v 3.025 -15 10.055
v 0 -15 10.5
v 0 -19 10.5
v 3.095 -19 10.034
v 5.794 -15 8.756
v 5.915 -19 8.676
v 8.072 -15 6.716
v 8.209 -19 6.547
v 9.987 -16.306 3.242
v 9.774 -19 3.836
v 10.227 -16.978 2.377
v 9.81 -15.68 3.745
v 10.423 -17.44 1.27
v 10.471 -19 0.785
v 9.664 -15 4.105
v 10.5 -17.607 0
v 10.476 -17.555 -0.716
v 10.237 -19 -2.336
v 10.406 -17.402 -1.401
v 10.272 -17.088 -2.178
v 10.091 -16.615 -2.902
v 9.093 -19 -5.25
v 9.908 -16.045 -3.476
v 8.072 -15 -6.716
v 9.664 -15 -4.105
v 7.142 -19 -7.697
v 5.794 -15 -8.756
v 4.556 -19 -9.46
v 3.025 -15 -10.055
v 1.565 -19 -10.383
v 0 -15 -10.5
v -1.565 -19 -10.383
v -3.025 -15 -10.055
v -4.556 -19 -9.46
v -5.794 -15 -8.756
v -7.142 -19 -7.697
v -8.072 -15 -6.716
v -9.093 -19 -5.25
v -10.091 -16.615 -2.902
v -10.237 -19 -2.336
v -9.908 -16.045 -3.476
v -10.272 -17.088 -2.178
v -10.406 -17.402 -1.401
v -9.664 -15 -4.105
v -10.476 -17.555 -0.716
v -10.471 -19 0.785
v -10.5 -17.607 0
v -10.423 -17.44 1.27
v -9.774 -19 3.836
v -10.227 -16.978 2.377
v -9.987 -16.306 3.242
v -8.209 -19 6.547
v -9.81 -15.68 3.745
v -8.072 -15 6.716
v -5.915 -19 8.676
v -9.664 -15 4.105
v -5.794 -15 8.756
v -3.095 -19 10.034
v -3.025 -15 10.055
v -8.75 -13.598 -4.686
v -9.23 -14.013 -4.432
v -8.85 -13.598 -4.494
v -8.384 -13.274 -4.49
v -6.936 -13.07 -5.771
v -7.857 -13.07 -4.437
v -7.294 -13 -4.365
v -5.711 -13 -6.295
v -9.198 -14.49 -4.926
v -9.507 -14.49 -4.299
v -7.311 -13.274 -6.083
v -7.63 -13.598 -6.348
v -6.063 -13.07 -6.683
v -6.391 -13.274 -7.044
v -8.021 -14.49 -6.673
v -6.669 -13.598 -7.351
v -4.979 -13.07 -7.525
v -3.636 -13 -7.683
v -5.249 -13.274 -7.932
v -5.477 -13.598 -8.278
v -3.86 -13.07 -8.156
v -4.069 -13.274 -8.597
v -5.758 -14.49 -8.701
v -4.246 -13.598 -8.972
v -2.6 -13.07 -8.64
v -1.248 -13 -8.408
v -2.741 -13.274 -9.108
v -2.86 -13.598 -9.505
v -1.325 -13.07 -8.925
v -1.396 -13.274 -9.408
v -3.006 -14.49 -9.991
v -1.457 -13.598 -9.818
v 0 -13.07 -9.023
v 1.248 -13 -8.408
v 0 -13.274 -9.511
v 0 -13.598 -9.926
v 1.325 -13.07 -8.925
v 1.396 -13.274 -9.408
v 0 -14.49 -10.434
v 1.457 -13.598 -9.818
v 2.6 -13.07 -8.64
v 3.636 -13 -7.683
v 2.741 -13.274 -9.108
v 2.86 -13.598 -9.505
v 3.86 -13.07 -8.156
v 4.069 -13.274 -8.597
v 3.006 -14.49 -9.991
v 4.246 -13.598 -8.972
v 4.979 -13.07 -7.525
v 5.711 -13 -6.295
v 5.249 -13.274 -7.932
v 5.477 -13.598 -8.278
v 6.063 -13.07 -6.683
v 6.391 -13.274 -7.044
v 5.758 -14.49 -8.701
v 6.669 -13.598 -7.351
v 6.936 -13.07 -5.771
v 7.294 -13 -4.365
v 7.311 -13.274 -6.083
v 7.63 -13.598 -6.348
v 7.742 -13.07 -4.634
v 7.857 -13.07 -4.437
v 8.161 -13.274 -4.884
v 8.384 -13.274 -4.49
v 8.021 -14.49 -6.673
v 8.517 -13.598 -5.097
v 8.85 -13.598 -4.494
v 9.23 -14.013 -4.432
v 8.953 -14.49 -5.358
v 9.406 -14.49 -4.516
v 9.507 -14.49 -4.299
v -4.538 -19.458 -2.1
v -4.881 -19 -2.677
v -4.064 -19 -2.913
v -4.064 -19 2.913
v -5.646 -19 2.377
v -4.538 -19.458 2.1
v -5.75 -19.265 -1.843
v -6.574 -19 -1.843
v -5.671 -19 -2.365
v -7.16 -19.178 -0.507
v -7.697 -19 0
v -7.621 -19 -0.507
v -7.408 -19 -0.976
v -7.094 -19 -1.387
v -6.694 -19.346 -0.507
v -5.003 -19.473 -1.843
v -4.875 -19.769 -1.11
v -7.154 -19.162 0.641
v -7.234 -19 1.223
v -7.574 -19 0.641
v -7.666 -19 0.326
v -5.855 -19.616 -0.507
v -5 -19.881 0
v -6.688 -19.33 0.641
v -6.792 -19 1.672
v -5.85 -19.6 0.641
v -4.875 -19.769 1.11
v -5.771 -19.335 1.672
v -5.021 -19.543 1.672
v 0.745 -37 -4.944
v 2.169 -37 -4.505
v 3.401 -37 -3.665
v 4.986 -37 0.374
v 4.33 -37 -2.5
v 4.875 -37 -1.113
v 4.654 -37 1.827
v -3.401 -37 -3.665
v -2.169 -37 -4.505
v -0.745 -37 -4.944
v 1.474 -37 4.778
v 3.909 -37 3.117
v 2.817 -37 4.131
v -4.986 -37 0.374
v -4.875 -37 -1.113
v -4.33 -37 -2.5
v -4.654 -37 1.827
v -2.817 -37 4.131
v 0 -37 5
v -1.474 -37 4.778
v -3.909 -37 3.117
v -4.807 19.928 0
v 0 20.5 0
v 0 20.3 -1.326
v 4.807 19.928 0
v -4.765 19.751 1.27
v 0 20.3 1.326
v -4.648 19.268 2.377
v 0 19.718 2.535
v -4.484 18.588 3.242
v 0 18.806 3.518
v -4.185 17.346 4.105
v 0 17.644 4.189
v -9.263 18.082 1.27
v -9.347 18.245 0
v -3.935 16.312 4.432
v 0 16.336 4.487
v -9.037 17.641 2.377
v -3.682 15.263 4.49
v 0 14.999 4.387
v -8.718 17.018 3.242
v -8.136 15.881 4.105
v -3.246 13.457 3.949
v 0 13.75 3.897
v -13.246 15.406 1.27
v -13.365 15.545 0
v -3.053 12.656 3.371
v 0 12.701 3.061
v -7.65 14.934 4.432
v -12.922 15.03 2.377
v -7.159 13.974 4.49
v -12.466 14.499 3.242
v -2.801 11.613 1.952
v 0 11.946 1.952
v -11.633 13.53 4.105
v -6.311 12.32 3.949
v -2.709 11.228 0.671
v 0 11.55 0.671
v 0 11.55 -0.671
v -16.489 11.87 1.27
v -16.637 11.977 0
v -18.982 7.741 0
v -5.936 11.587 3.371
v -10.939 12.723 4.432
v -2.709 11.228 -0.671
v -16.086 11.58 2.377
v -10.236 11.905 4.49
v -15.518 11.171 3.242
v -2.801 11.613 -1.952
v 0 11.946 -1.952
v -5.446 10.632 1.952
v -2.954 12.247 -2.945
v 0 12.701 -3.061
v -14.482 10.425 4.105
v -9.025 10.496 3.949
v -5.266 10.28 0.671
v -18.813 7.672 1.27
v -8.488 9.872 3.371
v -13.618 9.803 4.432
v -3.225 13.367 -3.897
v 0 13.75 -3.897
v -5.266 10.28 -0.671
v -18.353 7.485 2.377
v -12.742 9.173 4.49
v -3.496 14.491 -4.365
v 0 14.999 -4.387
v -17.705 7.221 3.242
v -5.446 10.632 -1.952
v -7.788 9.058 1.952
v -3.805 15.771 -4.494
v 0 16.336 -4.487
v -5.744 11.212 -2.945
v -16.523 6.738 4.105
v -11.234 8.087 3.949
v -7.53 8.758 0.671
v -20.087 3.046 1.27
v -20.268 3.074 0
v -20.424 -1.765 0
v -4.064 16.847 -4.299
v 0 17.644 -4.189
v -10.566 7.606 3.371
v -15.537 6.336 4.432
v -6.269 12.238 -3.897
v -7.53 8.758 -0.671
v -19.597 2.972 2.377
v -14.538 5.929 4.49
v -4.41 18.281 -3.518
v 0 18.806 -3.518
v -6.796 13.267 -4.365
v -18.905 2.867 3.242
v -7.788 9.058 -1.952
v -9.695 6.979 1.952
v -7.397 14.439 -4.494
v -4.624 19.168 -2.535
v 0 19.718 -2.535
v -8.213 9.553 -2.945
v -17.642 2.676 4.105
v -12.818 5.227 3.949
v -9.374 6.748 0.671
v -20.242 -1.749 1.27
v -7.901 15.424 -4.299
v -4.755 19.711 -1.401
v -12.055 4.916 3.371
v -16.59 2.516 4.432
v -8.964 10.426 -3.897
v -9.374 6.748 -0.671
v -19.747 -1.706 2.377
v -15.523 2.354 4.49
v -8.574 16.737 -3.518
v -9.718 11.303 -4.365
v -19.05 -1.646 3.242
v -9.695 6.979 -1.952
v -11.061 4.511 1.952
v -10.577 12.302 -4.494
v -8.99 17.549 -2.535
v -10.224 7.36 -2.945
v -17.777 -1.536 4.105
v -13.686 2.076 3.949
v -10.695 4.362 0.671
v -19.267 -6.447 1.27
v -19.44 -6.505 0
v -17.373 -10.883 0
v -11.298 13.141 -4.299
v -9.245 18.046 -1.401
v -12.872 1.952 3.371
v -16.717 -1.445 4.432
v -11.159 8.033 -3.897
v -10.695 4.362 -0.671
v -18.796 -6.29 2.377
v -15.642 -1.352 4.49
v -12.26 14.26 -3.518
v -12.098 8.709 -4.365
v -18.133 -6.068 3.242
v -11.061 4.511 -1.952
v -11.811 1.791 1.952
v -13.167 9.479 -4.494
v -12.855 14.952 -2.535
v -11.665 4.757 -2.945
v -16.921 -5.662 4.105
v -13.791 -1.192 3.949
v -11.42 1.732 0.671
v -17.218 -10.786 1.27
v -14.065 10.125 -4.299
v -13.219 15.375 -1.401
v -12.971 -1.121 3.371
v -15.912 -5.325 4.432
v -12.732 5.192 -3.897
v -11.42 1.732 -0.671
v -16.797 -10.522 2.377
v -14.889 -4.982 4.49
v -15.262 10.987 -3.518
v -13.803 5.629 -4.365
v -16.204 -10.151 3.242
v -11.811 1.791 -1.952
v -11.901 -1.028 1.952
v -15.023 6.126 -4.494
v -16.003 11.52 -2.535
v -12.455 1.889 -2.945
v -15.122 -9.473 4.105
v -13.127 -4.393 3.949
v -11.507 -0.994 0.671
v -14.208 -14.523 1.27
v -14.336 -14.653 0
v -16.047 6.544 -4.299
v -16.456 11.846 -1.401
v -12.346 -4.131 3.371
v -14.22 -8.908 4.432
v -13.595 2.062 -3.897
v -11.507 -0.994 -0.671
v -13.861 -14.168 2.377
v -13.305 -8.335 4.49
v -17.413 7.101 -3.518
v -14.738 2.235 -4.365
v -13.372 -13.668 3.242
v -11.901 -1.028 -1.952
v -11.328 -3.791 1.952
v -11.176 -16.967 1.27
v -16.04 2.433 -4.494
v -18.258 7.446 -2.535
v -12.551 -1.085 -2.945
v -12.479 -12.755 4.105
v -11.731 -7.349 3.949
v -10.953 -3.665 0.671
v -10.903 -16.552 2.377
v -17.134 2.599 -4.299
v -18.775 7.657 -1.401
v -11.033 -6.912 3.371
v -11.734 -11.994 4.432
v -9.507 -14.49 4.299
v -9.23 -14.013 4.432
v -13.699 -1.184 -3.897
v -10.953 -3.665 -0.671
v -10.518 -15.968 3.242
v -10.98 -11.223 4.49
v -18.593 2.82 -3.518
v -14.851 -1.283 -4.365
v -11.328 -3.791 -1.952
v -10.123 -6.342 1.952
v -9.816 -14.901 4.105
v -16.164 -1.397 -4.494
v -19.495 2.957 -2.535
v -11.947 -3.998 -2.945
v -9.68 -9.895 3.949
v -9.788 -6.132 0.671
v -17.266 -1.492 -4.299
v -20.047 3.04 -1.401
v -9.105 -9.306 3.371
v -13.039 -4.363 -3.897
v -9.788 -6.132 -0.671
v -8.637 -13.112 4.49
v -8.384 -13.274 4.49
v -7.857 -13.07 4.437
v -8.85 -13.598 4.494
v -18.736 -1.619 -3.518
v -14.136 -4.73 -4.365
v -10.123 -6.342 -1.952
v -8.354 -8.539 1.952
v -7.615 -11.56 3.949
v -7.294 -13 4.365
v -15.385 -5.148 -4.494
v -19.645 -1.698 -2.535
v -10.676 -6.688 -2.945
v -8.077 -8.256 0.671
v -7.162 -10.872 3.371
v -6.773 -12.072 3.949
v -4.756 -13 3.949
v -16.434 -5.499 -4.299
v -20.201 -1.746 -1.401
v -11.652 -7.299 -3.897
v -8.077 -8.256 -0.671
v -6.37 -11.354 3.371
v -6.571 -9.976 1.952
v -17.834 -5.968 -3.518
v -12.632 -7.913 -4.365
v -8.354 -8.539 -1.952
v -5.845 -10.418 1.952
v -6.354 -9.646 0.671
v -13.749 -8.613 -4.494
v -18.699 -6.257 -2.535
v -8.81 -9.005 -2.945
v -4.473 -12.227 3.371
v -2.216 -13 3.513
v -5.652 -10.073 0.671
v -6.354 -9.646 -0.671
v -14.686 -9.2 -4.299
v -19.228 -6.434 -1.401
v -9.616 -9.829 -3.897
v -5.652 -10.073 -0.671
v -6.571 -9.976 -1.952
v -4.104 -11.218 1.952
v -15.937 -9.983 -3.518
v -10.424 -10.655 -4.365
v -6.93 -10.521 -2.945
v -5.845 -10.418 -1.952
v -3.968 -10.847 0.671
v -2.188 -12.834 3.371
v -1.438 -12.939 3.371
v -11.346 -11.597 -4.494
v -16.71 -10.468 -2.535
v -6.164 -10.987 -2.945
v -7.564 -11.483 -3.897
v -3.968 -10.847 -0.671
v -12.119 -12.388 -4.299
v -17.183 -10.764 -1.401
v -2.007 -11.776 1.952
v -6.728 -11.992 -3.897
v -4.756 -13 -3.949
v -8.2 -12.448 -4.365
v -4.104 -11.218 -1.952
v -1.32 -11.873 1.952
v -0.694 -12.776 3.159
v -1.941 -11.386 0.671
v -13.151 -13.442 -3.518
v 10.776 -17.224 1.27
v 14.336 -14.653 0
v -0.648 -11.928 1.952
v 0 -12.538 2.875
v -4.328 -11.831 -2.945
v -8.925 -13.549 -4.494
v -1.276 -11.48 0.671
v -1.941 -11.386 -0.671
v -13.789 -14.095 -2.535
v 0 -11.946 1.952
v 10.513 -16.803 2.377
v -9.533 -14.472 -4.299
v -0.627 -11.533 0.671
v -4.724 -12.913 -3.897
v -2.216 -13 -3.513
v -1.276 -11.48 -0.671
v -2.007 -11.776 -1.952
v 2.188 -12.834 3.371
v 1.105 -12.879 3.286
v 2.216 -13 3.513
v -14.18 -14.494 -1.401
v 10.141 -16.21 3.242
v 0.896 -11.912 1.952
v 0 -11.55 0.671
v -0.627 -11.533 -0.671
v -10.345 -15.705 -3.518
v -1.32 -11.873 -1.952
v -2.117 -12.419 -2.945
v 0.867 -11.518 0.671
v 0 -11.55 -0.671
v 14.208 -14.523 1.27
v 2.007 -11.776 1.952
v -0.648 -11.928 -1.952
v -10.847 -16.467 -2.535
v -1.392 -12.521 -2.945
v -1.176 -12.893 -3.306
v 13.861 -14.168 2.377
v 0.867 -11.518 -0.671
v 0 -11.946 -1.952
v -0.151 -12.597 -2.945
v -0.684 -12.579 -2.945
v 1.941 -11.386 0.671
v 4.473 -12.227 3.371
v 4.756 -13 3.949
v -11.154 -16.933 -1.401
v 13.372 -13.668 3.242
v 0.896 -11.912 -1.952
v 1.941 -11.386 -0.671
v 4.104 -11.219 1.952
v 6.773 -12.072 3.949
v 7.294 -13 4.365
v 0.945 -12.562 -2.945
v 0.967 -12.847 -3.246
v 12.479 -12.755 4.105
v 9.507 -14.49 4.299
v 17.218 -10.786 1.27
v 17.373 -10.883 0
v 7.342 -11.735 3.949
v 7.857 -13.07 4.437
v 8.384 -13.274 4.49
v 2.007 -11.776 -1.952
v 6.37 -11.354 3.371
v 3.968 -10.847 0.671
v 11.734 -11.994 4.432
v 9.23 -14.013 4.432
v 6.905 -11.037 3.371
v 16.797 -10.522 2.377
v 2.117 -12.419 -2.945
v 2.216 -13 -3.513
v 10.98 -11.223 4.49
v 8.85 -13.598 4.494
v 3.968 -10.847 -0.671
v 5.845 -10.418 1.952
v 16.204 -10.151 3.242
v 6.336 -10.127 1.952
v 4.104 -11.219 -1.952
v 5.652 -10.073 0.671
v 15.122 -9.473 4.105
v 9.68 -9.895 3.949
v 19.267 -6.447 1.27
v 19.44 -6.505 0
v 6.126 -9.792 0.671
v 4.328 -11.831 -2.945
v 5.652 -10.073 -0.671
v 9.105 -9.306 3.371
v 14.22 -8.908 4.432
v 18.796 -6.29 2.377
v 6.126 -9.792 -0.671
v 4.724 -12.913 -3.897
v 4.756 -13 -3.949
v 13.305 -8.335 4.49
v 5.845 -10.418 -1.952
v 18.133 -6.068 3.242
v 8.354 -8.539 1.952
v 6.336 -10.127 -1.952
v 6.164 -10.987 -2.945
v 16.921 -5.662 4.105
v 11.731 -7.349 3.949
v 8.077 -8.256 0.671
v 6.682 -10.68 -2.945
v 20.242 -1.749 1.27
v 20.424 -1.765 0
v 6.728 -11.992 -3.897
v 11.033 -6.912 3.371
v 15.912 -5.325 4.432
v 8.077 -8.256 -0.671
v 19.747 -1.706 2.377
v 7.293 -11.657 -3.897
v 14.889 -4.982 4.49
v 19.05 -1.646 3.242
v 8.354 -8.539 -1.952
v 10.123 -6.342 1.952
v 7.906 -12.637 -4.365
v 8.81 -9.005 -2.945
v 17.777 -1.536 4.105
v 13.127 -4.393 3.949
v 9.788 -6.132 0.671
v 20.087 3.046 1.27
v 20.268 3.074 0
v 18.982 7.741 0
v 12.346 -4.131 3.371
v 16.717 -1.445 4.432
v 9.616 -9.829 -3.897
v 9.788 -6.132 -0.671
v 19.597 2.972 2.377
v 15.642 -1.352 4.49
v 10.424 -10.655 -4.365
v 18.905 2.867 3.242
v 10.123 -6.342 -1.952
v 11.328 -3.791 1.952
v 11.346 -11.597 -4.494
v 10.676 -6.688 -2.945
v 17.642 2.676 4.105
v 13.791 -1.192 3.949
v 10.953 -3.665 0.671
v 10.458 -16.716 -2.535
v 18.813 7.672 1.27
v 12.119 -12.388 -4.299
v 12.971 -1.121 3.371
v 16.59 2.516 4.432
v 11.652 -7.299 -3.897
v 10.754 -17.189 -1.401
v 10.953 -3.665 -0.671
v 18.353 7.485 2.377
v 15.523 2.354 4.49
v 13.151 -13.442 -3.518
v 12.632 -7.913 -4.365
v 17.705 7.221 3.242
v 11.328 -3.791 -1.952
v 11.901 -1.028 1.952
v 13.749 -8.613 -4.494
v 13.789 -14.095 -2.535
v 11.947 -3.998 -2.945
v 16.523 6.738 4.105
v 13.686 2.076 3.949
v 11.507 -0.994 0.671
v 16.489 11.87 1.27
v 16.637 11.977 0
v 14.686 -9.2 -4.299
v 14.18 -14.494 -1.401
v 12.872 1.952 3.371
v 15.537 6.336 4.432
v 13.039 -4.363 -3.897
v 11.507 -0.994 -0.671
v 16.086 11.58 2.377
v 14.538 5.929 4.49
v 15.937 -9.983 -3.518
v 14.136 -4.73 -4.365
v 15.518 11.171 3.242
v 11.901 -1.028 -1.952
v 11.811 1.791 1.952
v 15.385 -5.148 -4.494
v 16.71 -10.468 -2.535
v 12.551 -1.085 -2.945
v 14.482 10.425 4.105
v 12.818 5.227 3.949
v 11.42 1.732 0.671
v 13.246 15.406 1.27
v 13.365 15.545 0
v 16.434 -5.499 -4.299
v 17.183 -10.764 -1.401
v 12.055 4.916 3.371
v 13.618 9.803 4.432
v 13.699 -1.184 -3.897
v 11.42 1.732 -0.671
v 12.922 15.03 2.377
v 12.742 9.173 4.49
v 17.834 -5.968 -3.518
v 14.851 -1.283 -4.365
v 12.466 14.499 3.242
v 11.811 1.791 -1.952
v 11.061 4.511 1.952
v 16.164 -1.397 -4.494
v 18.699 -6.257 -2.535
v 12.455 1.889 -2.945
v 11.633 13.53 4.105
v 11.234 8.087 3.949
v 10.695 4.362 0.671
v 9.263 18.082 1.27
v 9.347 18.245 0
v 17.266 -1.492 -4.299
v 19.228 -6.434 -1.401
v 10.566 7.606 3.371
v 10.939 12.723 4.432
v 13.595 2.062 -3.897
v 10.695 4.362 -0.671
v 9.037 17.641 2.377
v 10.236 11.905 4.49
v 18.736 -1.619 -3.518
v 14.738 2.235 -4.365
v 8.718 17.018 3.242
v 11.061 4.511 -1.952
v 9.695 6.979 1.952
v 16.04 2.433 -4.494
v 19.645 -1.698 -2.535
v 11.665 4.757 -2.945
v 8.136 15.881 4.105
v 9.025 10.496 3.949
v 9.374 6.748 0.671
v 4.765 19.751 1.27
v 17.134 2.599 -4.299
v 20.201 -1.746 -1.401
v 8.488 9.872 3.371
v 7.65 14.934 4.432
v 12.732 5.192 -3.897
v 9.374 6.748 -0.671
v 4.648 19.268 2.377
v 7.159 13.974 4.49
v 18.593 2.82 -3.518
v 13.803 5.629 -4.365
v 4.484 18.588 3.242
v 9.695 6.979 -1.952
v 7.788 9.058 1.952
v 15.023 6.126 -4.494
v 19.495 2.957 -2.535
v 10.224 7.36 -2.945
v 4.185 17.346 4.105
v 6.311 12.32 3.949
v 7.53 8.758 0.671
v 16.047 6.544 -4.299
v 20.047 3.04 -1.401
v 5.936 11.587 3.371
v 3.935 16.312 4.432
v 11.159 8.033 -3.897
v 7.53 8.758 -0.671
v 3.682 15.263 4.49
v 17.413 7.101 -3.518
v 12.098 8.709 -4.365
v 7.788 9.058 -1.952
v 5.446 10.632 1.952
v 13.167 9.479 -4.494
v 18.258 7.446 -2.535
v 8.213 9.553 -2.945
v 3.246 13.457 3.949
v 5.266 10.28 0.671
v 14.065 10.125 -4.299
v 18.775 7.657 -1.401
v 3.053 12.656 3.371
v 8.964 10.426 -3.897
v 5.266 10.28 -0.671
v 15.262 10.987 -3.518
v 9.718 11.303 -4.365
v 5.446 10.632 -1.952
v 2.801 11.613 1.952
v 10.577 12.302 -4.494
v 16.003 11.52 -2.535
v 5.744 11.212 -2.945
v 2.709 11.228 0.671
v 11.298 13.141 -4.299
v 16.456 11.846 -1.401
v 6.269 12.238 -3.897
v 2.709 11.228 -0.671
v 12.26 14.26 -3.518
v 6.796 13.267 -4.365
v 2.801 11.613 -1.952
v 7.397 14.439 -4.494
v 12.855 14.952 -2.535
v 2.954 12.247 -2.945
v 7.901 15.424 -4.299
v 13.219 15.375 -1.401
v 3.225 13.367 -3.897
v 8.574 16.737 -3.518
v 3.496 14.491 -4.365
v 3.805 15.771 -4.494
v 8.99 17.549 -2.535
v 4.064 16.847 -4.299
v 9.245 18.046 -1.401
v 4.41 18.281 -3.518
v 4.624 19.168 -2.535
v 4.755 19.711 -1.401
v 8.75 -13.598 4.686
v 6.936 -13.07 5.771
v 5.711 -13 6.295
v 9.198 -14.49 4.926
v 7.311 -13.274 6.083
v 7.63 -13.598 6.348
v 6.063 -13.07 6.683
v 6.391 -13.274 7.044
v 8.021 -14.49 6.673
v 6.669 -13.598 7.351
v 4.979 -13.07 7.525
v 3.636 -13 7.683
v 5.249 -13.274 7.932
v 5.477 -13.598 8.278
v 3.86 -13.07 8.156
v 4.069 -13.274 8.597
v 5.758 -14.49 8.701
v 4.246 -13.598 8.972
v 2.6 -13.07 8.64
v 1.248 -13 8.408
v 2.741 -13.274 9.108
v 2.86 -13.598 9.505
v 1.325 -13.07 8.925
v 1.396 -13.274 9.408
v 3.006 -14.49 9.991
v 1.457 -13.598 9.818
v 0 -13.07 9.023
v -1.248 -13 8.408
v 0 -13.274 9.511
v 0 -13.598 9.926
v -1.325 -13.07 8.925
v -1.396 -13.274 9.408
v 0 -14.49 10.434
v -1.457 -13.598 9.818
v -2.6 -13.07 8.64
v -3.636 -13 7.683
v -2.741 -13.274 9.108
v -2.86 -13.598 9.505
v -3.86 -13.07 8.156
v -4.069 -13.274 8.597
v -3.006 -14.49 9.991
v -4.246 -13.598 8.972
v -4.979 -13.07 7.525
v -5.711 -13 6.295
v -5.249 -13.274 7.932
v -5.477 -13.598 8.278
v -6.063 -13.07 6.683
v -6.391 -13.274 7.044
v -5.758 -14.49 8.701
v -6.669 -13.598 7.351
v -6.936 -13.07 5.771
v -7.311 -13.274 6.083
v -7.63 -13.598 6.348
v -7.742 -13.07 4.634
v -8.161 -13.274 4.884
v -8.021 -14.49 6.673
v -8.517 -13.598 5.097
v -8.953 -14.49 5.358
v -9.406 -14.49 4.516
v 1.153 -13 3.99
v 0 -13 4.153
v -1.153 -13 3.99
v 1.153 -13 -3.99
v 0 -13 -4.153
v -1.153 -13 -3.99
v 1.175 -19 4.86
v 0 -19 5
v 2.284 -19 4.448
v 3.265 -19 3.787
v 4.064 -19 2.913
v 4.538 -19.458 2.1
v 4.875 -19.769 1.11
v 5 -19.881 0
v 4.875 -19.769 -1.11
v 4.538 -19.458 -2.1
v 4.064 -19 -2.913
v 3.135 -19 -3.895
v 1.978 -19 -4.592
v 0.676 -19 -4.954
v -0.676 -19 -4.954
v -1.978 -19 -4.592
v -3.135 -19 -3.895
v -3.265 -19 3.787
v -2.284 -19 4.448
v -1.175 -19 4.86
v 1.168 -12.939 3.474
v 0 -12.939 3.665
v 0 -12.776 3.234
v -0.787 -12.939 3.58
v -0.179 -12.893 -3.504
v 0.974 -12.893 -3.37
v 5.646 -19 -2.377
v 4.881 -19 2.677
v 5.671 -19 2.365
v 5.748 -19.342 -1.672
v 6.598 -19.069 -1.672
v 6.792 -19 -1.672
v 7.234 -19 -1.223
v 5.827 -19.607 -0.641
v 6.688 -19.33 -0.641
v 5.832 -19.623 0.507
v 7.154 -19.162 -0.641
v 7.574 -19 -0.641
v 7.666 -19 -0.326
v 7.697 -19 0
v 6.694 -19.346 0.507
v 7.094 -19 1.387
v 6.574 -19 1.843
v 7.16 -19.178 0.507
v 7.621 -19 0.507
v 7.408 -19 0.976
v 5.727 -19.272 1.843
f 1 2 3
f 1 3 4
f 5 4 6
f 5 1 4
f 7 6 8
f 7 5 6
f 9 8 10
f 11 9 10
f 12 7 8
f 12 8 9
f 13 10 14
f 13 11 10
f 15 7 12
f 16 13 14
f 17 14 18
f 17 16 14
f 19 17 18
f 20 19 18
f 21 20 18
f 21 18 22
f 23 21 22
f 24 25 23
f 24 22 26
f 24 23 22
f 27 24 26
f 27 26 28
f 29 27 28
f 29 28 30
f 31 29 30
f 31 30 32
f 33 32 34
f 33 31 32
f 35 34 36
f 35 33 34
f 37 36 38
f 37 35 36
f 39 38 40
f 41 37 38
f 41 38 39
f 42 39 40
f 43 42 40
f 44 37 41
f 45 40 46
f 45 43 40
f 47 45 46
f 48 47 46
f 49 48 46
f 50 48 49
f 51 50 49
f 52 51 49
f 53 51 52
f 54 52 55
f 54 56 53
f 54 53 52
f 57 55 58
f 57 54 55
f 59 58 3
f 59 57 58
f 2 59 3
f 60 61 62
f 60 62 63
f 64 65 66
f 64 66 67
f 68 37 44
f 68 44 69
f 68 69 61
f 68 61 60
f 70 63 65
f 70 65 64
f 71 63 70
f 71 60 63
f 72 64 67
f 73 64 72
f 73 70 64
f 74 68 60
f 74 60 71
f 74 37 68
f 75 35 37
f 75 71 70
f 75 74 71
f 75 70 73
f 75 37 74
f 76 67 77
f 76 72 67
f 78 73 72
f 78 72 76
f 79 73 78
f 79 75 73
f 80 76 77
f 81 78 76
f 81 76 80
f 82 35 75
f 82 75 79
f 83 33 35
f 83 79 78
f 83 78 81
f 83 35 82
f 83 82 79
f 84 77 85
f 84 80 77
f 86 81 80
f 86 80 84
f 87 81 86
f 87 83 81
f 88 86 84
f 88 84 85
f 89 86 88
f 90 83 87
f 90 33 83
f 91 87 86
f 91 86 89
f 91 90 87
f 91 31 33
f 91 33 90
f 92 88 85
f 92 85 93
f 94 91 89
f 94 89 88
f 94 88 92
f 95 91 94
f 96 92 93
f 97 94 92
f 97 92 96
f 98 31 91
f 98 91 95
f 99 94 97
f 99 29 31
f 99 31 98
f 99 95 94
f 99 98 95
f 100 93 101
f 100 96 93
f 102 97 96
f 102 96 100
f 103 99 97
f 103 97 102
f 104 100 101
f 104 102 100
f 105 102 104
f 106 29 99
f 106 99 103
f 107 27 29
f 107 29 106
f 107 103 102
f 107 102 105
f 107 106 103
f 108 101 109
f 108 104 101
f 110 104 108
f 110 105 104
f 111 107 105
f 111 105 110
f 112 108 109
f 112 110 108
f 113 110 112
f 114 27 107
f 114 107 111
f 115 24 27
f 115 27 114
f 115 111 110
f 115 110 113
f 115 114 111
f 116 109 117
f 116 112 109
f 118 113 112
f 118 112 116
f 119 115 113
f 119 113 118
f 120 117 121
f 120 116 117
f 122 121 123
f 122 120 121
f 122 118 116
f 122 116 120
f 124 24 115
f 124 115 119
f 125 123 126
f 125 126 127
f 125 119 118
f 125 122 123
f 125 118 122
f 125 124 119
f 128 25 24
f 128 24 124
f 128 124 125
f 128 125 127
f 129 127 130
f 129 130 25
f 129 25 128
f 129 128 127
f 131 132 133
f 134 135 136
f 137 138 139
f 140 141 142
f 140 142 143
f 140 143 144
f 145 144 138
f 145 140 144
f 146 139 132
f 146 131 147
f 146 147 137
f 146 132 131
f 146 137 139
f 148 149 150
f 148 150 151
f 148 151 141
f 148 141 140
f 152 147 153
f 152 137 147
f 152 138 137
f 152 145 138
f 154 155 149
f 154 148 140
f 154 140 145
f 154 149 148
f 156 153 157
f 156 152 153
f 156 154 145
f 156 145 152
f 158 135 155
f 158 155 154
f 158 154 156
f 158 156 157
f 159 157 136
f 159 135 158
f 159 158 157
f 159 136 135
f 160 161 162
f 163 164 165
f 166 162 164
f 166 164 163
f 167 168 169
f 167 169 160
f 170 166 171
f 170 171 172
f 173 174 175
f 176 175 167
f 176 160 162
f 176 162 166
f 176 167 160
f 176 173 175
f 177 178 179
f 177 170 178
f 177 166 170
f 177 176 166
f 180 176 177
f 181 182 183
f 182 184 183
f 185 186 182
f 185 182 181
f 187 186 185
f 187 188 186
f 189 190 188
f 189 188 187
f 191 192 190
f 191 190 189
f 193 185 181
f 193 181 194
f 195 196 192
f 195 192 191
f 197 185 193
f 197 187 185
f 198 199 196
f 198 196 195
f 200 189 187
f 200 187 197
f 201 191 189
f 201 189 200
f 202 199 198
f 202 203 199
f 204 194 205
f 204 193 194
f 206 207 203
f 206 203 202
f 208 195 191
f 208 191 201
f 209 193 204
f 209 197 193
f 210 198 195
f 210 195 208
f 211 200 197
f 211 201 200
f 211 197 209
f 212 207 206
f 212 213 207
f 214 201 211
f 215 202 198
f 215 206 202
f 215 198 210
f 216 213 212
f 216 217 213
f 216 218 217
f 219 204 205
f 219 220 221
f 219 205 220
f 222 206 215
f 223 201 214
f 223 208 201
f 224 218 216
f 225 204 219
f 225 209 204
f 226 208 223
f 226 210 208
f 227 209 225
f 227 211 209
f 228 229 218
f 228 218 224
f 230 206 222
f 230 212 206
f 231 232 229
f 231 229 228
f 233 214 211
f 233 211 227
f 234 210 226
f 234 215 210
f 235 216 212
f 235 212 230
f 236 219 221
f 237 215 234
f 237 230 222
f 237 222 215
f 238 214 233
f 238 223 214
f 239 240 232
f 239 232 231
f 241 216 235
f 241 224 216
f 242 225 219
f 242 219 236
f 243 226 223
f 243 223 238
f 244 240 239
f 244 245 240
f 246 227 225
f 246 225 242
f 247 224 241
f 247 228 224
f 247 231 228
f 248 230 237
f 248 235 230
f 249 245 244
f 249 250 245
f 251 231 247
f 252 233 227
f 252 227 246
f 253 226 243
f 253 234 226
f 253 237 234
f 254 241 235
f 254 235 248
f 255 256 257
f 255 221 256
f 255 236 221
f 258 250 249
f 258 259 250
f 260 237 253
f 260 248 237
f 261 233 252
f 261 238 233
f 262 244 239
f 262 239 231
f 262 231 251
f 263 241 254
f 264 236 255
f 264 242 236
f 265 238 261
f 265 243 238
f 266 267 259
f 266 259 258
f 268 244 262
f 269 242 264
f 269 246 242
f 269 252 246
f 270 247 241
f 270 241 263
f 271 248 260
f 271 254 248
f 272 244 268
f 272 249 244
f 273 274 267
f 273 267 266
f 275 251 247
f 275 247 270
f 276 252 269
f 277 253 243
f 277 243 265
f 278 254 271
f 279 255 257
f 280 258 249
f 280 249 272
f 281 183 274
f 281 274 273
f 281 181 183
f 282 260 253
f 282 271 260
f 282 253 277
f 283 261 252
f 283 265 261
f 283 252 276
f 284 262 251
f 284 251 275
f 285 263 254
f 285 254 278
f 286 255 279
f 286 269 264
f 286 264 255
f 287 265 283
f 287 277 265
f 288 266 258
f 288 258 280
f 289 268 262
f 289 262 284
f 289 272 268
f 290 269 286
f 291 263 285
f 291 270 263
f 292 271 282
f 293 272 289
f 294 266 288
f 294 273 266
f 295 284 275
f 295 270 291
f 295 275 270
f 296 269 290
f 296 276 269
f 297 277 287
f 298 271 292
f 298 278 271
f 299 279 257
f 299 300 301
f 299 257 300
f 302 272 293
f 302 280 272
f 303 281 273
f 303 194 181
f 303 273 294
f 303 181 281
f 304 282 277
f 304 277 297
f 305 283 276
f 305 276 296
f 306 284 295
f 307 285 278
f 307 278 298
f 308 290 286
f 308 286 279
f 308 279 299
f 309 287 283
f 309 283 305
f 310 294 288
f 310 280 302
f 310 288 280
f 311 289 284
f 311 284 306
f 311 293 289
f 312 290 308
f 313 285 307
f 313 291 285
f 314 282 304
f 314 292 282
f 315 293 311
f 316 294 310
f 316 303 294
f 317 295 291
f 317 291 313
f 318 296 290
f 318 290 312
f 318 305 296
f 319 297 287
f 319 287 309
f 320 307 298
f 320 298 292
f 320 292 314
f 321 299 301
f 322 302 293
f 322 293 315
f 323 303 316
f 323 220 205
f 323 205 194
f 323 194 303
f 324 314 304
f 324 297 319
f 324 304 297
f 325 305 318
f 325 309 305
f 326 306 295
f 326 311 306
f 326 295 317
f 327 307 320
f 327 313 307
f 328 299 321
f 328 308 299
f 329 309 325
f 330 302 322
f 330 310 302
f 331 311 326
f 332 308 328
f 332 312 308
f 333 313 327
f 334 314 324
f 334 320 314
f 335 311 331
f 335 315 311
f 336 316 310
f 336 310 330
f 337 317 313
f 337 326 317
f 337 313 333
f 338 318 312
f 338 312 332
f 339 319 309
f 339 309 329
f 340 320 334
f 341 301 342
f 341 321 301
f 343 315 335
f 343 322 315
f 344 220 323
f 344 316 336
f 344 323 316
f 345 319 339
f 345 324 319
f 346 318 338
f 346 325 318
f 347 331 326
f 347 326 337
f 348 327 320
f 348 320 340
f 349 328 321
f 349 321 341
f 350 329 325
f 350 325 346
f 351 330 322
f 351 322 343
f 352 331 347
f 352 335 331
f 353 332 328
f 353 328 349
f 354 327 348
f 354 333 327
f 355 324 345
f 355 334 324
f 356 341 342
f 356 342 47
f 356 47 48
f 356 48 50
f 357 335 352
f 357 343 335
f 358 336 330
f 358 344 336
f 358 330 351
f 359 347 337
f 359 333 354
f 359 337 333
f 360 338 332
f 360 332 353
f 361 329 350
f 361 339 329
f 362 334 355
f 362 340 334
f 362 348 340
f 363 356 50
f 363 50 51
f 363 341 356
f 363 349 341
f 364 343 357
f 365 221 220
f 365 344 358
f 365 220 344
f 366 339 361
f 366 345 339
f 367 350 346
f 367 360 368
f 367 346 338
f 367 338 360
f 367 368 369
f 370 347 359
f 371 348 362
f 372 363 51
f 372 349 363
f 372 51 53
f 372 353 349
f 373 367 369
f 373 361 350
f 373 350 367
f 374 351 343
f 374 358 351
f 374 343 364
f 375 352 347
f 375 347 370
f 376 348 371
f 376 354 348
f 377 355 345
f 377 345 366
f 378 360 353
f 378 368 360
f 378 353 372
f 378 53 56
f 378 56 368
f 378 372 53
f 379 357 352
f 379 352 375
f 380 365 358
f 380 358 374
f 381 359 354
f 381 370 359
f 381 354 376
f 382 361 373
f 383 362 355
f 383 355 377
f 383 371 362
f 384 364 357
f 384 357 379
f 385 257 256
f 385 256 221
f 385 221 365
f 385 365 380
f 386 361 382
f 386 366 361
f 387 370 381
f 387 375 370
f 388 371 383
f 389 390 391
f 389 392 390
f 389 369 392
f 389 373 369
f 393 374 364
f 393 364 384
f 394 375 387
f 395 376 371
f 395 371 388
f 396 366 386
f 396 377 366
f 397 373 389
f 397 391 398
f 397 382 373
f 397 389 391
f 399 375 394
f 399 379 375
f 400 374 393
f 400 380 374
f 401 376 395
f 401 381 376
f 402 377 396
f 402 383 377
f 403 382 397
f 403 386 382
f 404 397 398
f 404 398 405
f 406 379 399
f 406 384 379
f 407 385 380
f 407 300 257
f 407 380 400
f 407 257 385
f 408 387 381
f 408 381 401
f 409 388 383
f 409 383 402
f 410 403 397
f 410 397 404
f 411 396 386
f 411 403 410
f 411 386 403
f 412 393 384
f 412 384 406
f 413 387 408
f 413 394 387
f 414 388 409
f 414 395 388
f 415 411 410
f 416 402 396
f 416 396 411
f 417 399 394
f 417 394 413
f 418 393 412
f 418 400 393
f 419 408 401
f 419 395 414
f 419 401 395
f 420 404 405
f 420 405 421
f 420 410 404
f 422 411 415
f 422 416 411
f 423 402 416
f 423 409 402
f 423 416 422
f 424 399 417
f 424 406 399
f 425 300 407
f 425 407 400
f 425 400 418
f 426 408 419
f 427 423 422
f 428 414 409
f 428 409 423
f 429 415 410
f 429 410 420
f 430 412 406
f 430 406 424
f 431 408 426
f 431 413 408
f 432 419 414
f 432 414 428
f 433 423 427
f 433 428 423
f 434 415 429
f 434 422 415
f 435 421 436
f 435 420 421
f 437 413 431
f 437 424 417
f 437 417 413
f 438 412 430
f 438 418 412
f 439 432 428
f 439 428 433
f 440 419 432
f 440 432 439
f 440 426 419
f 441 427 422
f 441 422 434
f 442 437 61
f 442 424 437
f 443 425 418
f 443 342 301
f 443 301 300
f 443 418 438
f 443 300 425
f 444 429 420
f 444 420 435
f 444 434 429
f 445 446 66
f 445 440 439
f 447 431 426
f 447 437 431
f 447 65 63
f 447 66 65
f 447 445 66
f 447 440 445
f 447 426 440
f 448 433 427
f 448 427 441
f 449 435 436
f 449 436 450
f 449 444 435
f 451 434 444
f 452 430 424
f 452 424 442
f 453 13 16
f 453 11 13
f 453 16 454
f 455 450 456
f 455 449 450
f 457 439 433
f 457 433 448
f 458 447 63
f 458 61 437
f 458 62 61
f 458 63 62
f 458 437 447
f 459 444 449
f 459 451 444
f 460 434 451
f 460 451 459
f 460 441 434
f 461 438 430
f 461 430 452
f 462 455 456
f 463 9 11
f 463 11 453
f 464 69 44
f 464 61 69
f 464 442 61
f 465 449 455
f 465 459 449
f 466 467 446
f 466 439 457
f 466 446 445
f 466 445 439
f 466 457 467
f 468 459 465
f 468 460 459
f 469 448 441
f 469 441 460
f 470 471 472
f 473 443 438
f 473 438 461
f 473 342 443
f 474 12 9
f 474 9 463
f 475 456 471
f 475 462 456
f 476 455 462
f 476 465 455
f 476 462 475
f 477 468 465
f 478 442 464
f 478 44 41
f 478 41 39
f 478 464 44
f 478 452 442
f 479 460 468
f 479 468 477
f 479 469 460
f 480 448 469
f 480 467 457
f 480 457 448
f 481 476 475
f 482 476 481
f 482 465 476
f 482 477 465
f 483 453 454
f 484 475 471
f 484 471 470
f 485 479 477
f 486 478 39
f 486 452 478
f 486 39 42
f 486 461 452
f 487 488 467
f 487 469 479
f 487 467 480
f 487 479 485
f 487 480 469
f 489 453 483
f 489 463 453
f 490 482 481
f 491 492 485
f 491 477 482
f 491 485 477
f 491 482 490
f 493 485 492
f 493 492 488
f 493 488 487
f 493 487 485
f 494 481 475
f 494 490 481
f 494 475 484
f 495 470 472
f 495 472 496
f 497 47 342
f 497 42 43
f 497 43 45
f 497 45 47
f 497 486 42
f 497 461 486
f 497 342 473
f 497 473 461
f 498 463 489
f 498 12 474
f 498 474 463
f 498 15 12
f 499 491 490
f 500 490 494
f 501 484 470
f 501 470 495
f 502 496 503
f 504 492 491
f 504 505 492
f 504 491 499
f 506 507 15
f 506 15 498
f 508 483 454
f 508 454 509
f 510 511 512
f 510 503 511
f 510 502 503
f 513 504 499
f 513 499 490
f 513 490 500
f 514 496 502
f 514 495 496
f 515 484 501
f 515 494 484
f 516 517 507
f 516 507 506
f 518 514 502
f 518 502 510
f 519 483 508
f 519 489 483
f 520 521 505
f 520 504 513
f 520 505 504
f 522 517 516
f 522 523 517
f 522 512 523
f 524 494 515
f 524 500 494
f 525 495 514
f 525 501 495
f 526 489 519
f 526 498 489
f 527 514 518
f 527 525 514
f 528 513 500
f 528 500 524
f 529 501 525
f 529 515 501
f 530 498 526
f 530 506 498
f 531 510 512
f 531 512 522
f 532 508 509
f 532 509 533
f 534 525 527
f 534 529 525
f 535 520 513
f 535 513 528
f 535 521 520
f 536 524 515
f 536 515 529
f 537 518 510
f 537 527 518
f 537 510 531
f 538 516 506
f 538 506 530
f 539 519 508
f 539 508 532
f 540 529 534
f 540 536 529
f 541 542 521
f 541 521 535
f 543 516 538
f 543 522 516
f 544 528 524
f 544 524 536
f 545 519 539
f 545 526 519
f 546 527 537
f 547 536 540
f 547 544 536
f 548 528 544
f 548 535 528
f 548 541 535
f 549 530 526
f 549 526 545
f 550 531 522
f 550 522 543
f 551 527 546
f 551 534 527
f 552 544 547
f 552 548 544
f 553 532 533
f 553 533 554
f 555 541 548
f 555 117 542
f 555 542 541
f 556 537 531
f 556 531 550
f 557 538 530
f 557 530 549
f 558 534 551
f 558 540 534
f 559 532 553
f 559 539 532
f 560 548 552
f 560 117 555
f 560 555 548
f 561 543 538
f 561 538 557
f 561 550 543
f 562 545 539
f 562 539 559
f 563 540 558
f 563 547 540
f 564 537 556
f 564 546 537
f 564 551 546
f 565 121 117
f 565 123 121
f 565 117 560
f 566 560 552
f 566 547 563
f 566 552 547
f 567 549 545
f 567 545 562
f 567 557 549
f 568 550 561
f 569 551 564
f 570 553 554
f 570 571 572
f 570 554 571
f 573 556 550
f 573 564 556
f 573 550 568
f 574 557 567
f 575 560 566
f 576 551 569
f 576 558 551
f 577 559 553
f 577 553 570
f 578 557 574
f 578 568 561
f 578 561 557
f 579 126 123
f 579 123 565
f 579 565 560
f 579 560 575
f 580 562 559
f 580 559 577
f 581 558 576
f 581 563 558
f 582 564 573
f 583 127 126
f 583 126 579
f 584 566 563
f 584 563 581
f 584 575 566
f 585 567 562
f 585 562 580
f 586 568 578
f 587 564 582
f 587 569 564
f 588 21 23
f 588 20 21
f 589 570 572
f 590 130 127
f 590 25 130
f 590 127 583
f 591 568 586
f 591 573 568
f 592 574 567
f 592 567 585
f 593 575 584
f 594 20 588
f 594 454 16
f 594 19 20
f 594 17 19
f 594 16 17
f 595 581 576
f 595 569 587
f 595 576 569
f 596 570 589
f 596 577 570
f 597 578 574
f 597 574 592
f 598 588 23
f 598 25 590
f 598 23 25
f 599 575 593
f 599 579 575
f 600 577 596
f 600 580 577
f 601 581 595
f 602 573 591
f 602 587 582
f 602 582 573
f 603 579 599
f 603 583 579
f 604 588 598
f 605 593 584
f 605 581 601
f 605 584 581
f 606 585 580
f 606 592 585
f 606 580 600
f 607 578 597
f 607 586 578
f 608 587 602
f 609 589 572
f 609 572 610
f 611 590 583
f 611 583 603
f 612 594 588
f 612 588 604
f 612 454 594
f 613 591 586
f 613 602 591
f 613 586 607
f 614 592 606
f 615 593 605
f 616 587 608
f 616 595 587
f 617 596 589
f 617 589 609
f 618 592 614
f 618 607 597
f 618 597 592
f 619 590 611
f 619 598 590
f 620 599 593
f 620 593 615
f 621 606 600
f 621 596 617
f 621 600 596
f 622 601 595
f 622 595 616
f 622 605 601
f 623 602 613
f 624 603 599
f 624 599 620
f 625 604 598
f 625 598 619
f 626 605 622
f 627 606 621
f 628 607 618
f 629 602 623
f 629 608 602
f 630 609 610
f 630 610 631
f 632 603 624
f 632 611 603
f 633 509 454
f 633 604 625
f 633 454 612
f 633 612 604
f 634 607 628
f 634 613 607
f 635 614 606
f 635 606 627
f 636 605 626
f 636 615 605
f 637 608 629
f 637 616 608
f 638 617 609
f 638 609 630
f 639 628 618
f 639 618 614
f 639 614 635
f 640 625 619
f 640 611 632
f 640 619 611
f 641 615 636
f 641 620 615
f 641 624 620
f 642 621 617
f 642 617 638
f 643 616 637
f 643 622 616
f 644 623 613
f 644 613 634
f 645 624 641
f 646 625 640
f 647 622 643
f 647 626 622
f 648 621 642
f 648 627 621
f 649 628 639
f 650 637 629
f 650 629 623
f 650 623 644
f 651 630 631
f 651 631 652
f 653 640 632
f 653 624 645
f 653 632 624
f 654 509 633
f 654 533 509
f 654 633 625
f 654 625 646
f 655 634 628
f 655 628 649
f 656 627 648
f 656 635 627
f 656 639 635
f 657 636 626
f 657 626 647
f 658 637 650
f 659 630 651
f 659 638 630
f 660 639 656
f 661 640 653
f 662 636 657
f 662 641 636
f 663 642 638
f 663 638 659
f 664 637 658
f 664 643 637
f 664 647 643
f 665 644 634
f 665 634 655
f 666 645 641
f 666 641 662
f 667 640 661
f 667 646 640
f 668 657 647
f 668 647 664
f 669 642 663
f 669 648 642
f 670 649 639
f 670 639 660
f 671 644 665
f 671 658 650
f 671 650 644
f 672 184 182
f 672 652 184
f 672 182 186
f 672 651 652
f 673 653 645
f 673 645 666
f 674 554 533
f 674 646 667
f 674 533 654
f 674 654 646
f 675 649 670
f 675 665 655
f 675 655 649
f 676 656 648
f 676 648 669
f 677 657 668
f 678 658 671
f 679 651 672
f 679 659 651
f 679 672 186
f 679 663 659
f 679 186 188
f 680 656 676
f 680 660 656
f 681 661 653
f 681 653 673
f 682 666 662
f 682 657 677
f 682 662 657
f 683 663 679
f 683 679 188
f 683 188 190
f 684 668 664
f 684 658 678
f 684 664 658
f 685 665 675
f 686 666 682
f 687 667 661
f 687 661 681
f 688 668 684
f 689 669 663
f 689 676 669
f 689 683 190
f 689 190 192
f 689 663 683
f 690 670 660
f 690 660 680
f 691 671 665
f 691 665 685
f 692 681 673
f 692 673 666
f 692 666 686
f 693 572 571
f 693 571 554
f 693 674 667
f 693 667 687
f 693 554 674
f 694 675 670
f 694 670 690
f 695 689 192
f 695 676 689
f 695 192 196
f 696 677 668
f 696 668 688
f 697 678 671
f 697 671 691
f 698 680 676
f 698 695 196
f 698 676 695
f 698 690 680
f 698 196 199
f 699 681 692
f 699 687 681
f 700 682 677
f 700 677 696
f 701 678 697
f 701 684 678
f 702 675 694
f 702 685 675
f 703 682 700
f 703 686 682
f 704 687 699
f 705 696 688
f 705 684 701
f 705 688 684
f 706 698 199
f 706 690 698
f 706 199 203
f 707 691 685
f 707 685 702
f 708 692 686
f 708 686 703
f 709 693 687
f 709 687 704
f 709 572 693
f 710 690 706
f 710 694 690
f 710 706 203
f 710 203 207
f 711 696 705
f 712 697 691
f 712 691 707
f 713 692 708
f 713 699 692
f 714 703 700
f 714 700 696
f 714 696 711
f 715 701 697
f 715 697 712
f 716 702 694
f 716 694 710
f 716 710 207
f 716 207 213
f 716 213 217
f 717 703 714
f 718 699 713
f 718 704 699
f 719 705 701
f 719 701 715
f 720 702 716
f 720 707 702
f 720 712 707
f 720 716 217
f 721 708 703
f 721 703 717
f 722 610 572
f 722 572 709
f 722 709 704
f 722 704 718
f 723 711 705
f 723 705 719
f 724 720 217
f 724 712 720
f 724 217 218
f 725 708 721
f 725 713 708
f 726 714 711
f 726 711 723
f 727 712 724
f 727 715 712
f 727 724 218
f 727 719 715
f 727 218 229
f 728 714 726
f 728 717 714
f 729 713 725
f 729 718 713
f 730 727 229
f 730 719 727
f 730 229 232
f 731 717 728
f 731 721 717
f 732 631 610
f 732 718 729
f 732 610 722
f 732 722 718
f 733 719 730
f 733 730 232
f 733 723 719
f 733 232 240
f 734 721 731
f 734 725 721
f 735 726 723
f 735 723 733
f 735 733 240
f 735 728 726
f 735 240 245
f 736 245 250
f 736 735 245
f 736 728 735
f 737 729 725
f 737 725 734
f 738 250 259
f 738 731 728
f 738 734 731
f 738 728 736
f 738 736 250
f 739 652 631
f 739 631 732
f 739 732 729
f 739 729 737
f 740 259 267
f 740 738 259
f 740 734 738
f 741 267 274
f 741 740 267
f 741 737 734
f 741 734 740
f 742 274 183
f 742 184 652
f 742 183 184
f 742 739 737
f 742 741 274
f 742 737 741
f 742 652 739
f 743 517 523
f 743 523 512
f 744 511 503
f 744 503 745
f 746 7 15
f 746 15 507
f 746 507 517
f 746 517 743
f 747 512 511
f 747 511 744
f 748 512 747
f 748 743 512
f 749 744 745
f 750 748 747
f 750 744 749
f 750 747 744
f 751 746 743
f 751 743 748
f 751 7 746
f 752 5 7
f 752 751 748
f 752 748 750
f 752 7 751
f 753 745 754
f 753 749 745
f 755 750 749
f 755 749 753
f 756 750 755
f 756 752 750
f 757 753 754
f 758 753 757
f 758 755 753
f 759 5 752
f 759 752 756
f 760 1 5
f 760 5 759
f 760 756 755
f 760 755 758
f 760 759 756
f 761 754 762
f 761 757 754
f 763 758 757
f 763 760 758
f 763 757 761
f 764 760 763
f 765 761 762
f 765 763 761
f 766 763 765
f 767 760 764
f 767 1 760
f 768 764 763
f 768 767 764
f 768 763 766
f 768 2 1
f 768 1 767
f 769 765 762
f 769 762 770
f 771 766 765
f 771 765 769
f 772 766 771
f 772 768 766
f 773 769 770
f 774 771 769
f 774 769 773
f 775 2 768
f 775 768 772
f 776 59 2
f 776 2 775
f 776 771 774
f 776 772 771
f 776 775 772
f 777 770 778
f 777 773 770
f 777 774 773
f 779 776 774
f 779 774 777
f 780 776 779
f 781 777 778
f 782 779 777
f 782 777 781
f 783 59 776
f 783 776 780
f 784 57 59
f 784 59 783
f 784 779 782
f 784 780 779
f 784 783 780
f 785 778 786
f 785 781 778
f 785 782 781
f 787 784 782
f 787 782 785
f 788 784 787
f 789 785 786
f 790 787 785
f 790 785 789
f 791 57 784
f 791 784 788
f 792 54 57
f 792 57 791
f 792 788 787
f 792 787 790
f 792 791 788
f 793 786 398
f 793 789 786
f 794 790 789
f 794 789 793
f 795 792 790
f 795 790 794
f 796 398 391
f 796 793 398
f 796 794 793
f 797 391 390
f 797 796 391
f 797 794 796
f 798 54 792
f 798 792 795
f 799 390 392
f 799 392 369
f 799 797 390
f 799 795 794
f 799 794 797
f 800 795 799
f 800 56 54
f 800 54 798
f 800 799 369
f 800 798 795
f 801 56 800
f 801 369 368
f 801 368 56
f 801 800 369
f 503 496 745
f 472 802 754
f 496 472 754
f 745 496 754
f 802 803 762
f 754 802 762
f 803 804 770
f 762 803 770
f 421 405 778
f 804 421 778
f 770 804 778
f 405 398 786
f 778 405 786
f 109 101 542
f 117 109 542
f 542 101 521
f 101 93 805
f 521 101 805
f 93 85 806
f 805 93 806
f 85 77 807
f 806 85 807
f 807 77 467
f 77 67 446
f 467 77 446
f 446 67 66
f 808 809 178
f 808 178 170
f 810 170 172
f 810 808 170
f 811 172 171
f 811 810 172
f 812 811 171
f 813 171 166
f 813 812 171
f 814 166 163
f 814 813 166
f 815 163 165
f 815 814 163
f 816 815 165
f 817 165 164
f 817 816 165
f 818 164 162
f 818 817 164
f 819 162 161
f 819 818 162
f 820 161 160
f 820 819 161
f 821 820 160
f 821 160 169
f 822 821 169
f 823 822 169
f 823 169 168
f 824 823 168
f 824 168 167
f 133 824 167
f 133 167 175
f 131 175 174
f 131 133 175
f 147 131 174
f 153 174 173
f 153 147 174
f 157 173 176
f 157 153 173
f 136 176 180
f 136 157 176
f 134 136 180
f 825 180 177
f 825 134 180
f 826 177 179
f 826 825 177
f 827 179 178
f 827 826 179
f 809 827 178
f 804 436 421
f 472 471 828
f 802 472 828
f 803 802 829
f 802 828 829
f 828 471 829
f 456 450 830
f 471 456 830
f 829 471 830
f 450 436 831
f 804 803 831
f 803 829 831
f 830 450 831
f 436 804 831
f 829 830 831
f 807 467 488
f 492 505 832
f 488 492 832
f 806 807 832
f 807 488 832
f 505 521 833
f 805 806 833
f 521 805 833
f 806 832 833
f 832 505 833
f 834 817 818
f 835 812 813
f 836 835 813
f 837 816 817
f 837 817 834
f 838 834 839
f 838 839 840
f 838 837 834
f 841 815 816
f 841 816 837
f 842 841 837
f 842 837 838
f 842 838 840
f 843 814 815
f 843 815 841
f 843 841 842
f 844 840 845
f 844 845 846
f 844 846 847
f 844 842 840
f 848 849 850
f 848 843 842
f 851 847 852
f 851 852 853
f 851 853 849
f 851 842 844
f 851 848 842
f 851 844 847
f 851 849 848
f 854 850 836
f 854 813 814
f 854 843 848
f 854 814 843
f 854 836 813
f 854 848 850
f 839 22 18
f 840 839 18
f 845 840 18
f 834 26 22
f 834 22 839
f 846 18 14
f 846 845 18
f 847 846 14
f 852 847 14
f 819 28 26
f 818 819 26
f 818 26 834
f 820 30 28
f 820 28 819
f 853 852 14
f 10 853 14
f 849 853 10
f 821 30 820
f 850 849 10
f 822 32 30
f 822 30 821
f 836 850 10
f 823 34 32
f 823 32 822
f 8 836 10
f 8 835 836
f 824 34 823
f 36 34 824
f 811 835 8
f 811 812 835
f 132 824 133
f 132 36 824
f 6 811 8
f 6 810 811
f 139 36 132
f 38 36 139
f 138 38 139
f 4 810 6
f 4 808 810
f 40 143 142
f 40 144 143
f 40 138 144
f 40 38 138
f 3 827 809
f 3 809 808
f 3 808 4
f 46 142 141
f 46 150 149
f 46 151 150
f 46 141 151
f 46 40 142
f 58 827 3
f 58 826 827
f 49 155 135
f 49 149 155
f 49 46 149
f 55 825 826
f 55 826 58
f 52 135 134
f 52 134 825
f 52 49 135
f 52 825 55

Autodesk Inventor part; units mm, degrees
ref_plane "YZ Plane" through (0, 0, 0) normal (1, 0, 0) x (0, 1, 0)
ref_plane "XZ Plane" through (0, 0, 0) normal (0, 1, 0) x (-1, 0, 0)
ref_plane "XY Plane" through (0, 0, 0) normal (0, 0, 1) x (1, 0, 0)
sketch "Sketch1" plane through (0, 0, 0) normal (1, 0, 0) x (0, 1, 0)
  line L0 (0, 16.3189) -> (0, -16.3189) construction
  line L1 (15.6465, 0) -> (-15.6465, 0) construction
  circle A0 centre (16, 0) radius 4.5
  line L2 (-19, 10.5) -> (-19, 0)
  circle A1 centre (-16, 0) radius 4.5 construction
  line L3 (-19, 10.5) -> (-15, 10.5)
  line L4 (-13, 8.5) -> (-13, 4.1533)
  arc A2 (-11.5, 0) -> (-12.5385, 2.8754) centre (-16, 0) ccw
  line L5 (-19, 0) -> (-11.5, 0)
  arc A3 (-13, 4.1533) -> (-12.5385, 2.8754) centre (-11, 4.1533) ccw
  arc A4 (-13, 8.5) -> (-15, 10.5) centre (-15, 8.5) ccw
  line L6 (-19, 0) -> (-37, 0)
  line L7 (-37, 0) -> (-37, 5)
  line L8 (-37, 5) -> (-19, 5)
  point P0 (0, 0)
  point P1 (0, 0)
  point P2 (-13, 10.5)
  point P3 (-13, 3.3541)
  dimension "D" = 9
  dimension "d1" = 16
  dimension "Emm" = 19
  dimension "B" = 21
  dimension "d4" = 6
  dimension "d5" = 2
  dimension "Amm" = 10
  dimension "Fmm" = 18
revolve "Revolution1" add sketch "Sketch1" angle 360 about axis through (0, 0, 16.3189) along (0, 0, -1) contours A0
revolve "Revolution2" add sketch "Sketch1" angle 360 about axis through (0, -19, 0) along (0, -1, 0) contours L3 A4 L4 A3 A2 L5 L2 | L2 L6 L7 L8
thread "Thread7" size "M10x1.5" class "6g" standard "ANSI Metric M Profile" full length
equation "\"d1\" = 0.5 * Cmm + D"
equation "\"d4\" = 0.666667 * D"
equation "\"Cmm\" = 14"
properties part number "M12 EYE BOLT" material "Steel, Carbon"
